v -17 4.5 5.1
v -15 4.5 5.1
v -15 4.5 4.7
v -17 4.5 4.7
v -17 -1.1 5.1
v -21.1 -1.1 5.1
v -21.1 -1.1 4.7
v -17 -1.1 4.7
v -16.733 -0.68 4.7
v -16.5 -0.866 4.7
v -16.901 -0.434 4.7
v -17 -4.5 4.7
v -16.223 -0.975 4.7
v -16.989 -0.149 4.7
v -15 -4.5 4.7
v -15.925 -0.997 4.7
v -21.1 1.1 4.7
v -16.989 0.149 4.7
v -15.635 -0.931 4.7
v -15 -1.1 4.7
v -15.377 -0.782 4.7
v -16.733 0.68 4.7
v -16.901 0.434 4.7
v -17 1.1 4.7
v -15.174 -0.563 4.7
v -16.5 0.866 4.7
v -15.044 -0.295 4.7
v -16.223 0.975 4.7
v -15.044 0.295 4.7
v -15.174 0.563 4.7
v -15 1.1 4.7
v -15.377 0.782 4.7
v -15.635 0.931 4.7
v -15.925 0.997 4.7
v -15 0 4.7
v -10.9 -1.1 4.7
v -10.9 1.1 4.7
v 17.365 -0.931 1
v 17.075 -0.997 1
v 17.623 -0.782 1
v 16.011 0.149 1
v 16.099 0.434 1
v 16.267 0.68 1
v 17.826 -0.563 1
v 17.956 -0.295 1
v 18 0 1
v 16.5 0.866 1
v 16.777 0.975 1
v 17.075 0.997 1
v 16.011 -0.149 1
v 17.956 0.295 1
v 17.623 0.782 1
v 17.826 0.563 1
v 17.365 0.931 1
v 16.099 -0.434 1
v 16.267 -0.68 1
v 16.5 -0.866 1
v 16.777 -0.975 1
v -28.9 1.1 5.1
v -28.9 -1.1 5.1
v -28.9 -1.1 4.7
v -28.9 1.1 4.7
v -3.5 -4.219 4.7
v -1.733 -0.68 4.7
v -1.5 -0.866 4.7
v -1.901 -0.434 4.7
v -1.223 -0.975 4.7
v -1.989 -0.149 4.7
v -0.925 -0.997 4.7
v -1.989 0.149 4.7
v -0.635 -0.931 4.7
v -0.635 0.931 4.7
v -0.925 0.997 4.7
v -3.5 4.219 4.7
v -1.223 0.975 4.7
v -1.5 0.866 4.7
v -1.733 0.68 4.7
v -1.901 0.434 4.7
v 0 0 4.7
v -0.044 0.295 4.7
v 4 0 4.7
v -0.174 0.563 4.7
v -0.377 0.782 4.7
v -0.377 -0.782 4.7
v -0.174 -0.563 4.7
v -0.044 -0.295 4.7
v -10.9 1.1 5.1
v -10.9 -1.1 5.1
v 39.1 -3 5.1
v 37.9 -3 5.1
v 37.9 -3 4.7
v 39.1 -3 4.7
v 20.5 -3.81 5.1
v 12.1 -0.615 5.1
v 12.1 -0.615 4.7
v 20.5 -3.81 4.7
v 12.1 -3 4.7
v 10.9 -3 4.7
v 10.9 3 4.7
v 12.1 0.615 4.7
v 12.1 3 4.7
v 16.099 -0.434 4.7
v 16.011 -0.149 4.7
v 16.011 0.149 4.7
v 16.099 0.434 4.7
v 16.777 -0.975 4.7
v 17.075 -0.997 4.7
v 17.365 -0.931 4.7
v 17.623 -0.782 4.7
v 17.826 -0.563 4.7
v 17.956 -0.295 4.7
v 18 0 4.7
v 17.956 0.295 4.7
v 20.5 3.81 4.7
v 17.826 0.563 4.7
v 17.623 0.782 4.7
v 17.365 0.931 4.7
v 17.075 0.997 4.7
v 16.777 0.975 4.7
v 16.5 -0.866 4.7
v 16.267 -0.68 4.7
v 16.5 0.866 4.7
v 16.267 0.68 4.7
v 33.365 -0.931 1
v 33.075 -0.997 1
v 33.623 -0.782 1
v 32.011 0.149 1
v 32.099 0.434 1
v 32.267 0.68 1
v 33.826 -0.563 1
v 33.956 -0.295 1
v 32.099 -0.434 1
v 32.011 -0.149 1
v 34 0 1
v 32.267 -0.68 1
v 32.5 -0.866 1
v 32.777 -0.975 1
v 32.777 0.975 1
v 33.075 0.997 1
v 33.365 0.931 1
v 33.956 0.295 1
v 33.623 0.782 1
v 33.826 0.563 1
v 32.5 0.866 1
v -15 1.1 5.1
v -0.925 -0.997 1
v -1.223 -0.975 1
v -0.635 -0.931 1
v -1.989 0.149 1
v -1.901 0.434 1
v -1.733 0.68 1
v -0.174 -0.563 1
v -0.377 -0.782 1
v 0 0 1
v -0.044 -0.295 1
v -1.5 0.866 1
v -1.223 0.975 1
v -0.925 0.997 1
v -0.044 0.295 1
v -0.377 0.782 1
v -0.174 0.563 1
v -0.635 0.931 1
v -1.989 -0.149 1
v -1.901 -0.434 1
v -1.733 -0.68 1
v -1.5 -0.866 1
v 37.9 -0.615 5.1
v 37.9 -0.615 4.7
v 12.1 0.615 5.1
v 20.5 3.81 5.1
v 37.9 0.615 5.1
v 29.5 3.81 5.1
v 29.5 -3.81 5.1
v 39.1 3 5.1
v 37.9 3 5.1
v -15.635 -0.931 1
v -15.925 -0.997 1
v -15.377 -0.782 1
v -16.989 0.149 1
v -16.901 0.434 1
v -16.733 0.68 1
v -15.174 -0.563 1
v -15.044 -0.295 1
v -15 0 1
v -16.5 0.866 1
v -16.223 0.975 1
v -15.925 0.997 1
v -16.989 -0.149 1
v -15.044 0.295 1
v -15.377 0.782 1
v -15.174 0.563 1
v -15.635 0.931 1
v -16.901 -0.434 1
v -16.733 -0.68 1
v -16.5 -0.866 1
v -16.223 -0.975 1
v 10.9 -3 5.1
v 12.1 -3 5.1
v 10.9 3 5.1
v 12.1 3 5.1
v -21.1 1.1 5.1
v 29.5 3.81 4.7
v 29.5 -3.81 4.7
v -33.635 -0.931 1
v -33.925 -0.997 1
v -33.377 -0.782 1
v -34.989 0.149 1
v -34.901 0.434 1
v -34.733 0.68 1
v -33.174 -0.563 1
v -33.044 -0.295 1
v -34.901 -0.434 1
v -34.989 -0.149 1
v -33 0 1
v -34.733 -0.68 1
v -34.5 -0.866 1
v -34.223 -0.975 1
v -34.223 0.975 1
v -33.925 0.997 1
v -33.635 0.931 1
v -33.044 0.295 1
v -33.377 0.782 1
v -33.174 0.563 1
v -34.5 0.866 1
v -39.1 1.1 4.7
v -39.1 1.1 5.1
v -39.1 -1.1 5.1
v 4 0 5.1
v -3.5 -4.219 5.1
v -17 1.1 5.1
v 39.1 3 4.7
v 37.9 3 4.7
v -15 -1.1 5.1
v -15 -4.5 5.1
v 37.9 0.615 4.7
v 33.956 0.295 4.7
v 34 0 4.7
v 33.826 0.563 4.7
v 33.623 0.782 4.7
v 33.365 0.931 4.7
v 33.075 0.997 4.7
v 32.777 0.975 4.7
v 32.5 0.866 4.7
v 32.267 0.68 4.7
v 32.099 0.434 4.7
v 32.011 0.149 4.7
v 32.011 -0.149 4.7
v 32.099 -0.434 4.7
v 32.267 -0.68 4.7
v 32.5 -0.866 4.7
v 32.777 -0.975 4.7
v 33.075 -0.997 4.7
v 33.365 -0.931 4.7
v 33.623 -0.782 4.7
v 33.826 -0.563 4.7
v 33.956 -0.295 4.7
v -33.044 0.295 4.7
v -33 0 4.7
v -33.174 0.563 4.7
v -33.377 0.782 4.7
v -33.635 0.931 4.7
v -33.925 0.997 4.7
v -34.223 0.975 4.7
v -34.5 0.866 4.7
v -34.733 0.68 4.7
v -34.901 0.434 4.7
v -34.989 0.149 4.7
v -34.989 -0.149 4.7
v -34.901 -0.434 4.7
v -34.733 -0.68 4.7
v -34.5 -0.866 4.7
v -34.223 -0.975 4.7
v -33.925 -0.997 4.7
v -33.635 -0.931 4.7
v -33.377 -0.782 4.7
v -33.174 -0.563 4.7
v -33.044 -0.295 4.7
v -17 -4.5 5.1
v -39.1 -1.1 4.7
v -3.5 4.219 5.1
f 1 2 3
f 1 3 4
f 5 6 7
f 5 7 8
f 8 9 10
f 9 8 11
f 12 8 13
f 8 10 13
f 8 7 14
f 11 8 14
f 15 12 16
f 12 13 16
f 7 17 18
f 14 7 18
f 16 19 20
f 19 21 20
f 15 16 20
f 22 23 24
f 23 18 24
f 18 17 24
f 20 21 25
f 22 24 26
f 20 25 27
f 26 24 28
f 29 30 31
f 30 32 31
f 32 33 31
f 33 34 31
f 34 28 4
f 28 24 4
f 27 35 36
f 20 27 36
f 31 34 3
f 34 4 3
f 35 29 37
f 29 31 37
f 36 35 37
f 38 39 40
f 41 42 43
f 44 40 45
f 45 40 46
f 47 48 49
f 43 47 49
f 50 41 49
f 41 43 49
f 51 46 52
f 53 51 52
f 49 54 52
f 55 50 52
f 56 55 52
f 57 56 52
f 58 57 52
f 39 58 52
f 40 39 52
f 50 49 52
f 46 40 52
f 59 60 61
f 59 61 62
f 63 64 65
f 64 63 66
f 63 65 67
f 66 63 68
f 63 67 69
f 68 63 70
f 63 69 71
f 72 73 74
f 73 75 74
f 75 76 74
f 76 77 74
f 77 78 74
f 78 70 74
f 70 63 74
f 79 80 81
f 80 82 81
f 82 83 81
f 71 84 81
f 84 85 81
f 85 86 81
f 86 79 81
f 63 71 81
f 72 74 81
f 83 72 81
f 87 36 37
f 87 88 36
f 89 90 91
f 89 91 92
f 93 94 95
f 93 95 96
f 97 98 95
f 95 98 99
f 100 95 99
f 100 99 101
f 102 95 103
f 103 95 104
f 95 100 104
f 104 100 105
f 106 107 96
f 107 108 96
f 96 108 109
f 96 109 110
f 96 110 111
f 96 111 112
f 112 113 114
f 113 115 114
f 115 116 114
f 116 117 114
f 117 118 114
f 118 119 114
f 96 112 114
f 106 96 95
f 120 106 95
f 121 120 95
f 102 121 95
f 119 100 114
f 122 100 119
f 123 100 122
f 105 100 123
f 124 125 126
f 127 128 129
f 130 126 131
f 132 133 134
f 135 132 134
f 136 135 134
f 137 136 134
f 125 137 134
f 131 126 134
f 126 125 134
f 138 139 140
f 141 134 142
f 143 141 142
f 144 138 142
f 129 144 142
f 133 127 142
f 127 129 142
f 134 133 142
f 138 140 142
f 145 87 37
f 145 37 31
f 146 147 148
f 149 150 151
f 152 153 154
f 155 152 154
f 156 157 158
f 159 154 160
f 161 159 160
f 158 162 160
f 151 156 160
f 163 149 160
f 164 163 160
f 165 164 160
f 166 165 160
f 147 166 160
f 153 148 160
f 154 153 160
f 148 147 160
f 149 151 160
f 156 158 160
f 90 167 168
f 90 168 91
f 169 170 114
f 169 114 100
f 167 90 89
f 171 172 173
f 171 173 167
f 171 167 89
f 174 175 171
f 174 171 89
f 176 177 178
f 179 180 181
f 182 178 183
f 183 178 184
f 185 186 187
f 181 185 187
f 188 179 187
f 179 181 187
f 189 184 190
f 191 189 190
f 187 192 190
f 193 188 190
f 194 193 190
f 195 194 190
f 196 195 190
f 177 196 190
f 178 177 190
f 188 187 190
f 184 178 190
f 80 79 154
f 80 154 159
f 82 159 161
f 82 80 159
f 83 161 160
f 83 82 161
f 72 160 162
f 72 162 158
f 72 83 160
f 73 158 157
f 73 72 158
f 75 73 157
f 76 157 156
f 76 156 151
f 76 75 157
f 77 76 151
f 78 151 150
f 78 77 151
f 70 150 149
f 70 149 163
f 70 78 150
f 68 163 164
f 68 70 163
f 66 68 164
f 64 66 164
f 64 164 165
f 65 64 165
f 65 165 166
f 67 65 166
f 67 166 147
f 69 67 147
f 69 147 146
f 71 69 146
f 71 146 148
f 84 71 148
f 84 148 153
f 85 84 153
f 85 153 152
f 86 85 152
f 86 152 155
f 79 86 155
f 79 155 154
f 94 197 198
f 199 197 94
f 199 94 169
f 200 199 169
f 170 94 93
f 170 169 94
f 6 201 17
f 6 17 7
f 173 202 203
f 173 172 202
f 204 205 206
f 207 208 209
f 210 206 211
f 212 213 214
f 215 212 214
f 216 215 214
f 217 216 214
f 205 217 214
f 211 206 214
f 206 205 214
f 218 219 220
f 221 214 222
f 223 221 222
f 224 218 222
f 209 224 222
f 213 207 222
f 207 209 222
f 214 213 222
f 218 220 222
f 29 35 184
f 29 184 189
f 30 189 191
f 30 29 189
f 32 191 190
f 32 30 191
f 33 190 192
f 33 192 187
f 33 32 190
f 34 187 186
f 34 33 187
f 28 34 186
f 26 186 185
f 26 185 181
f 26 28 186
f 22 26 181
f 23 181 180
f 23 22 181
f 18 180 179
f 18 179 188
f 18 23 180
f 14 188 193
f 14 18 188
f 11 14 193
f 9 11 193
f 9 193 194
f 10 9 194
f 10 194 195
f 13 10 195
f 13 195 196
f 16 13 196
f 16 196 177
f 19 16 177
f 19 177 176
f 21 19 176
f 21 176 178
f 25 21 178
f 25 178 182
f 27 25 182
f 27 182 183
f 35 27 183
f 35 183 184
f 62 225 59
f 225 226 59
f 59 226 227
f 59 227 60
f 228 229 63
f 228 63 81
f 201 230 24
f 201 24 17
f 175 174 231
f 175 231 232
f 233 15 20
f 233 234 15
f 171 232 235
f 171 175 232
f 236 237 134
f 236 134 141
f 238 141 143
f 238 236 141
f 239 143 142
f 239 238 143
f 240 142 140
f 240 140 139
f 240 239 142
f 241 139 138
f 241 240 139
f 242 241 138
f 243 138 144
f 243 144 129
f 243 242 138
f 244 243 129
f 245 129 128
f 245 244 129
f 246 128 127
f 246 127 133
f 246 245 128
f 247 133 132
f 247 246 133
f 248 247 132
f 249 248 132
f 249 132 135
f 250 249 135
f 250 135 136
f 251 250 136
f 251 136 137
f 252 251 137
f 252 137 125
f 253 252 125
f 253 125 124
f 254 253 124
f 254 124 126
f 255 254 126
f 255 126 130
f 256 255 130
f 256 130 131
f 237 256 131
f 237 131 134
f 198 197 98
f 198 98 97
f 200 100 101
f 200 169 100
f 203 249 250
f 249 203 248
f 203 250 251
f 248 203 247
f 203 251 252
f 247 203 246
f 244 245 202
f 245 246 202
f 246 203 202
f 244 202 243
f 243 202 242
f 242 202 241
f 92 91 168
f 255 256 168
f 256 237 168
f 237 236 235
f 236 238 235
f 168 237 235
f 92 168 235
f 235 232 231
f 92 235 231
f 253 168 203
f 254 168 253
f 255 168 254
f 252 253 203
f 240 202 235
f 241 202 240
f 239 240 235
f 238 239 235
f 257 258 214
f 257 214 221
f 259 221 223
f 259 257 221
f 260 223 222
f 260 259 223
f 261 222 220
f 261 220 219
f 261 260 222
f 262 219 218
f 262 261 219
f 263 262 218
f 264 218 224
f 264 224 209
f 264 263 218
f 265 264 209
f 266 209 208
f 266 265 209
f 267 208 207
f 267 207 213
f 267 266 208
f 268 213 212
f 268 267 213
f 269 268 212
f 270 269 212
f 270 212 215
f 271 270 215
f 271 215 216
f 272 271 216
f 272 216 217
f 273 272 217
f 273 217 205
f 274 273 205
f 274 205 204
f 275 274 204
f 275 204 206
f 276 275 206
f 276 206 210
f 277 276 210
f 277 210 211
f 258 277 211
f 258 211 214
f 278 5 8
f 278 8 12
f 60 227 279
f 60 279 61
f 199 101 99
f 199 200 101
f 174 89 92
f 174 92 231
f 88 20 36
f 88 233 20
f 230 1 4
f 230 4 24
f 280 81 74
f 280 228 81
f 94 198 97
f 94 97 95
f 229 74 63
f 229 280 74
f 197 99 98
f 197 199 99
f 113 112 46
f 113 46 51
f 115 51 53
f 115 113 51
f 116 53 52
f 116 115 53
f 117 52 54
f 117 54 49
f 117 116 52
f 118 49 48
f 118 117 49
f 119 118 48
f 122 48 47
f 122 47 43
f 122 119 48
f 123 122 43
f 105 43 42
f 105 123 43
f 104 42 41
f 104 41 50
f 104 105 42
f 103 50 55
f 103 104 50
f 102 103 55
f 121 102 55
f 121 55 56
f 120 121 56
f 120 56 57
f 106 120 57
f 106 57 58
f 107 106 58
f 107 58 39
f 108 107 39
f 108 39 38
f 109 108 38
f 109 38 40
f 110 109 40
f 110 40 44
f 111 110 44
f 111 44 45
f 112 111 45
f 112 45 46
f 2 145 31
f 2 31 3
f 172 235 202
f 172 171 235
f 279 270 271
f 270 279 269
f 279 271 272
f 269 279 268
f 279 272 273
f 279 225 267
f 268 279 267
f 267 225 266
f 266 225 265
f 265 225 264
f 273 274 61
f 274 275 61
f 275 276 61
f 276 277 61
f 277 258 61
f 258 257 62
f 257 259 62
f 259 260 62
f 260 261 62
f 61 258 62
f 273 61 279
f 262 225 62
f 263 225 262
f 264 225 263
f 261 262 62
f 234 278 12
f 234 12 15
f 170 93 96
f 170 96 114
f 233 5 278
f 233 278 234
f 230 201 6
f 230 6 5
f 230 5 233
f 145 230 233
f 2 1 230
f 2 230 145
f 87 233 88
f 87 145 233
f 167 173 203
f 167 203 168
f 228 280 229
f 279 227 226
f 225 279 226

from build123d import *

# Parameters (mm, degrees)
BOSS_EXTRUDE3_DEPTH        = 0.1
BOSS_EXTRUDE3_DEPTH_BACK   = 0.3
BOSS_EXTRUDE3_2_DEPTH      = 0.1
BOSS_EXTRUDE3_2_DEPTH_BACK = 0.3
SKETCH20_W                 = 10.2
SKETCH20_H                 = 2.2
BOSS_EXTRUDE3_3_DEPTH      = 0.1
BOSS_EXTRUDE3_3_DEPTH_BACK = 0.3
BOSS_EXTRUDE3_4_DEPTH      = 0.1
BOSS_EXTRUDE3_4_DEPTH_BACK = 0.3
BOSS_EXTRUDE3_5_DEPTH      = 0.1
BOSS_EXTRUDE3_5_DEPTH_BACK = 0.3
SKETCH21_R                 = 1
BOSS_EXTRUDE4_DEPTH        = 4


with BuildPart() as part:
    # Sketch20 → Boss-Extrude3 (new body, two sides)
    with BuildSketch(Plane.XY.offset(5)) as boss_extrude3_sk:
        Polygon((-3.5, 4.21875), (-3.5, -4.21875), (4, 0), align=None)
    extrude(amount=BOSS_EXTRUDE3_DEPTH)
    extrude(boss_extrude3_sk.sketch, amount=-BOSS_EXTRUDE3_DEPTH_BACK)



with BuildPart() as body_2:
    # Sketch20 → Boss-Extrude3 2 (new body, two sides)
    with BuildSketch(Plane.XY.offset(5)) as boss_extrude3_2_sk:
        Polygon((-10.9, -1.1), (-10.9, 1.1), (-15, 1.1), (-15, 4.5), (-17, 4.5), (-17, 1.1), (-21.1, 1.1), (-21.1, -1.1), (-17, -1.1), (-17, -4.5), (-15, -4.5), (-15, -1.1), align=None)
    extrude(amount=BOSS_EXTRUDE3_2_DEPTH)
    extrude(boss_extrude3_2_sk.sketch, amount=-BOSS_EXTRUDE3_2_DEPTH_BACK)


with BuildPart() as body_3:
    # Sketch20 → Boss-Extrude3 3 (new body, two sides)
    with BuildSketch(Plane.XY.offset(5)) as boss_extrude3_3_sk:
        with Locations((-34, 0)):
            Rectangle(SKETCH20_W, SKETCH20_H)
    extrude(amount=BOSS_EXTRUDE3_3_DEPTH)
    extrude(boss_extrude3_3_sk.sketch, amount=-BOSS_EXTRUDE3_3_DEPTH_BACK)


with BuildPart() as body_4:
    # Sketch20 → Boss-Extrude3 4 (new body, two sides)
    with BuildSketch(Plane.XY.offset(5)) as boss_extrude3_4_sk:
        Polygon((10.9, 3), (10.9, -3), (12.1, -3), (12.1, -0.61511422), (20.5, -3.809837878), (20.5, 3.809837878), (12.1, 0.61511422), (12.1, 3), align=None)
    extrude(amount=BOSS_EXTRUDE3_4_DEPTH)
    extrude(boss_extrude3_4_sk.sketch, amount=-BOSS_EXTRUDE3_4_DEPTH_BACK)


with BuildPart() as body_5:
    # Sketch20 → Boss-Extrude3 5 (new body, two sides)
    with BuildSketch(Plane.XY.offset(5)) as boss_extrude3_5_sk:
        Polygon((29.5, 3.809837878), (29.5, -3.809837878), (37.9, -0.61511422), (37.9, -3), (39.1, -3), (39.1, 3), (37.9, 3), (37.9, 0.61511422), align=None)
    extrude(amount=BOSS_EXTRUDE3_5_DEPTH)
    extrude(boss_extrude3_5_sk.sketch, amount=-BOSS_EXTRUDE3_5_DEPTH_BACK)


with BuildPart() as part_1:
    add(part.part)

    add(body_2.part)  # Boss-Extrude4 merges body 2

    add(body_3.part)  # Boss-Extrude4 merges body 3

    add(body_4.part)  # Boss-Extrude4 merges body 4

    add(body_5.part)  # Boss-Extrude4 merges body 5
    # Sketch21 → Boss-Extrude4 (add)
    with BuildSketch(Plane.XY.offset(5)):
        with Locations((-1, 0)):
            Circle(SKETCH21_R)
        with Locations((-16, 0)):
            Circle(SKETCH21_R)
        with Locations((-34, 0)):
            Circle(SKETCH21_R)
        with Locations((17, 0)):
            Circle(SKETCH21_R)
        with Locations((33, 0)):
            Circle(SKETCH21_R)
    extrude(amount=-BOSS_EXTRUDE4_DEPTH)


solid = part_1.part
